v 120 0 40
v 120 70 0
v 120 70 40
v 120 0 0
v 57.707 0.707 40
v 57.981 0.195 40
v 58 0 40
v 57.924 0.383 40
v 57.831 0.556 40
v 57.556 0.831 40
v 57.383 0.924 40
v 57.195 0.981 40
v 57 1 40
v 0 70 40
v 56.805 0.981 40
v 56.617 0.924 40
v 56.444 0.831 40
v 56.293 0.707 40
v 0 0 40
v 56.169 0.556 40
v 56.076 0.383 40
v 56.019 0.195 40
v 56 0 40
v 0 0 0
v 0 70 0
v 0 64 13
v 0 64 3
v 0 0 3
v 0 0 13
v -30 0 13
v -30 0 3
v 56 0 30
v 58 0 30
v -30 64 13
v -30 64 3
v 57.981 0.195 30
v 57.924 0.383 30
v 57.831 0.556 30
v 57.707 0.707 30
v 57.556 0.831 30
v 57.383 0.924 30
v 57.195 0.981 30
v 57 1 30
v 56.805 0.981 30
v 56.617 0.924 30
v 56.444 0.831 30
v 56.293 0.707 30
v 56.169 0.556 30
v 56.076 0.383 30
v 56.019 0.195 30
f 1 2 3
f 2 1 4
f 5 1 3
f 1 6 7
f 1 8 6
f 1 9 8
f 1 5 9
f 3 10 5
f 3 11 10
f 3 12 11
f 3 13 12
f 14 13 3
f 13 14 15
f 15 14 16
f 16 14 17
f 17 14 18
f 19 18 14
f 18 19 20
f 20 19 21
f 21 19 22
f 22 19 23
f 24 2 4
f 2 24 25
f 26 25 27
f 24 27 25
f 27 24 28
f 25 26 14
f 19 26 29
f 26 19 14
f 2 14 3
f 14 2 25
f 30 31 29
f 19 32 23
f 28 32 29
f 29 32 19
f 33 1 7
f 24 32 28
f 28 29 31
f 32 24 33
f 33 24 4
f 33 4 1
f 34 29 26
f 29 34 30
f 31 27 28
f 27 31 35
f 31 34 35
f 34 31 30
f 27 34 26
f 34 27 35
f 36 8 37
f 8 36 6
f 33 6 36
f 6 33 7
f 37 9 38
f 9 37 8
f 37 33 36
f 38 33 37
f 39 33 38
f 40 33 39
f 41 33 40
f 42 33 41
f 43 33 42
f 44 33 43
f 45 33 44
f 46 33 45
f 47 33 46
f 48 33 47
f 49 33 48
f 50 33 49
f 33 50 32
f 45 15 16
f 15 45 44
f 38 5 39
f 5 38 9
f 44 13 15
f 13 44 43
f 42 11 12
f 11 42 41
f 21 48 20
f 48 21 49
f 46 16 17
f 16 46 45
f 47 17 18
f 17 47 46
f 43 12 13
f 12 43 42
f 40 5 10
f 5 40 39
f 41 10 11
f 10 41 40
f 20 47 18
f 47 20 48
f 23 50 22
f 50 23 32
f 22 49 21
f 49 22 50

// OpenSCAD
// Mini Horizontal Gel Electrophoresis Buffer Tank
// Outer dimensions: 120 (X) x 70 (Y) x 40 (Z)
// Wall thickness: 3 mm
// Floor thickness: 3 mm
// Internal platform: 60 (X) x 70 (Y) x 10 (height from inner floor)

$fn = 64;

// Outer dimensions
X_out = 120;
Y_out = 70;
Z_out = 40;

// Thicknesses
wall_t = 3;
floor_t = 3;

// Derived inner dimensions
X_in  = X_out - 2 * wall_t;
Y_in  = Y_out - 2 * wall_t;
Z_in  = Z_out - floor_t; // Inner floor is at z = 0, top of floor is at z = floor_t

// Platform dimensions
plat_len = 60;
plat_w   = Y_in;
plat_h   = 10; // Height above inner floor

// Electrode hole dimensions
hole_d   = 2;
hole_y   = 0;
hole_z   = 30; // Height from inner floor

// Helper to create the main tank shell
module tank_shell() {
    // Base block (floor + walls)
    // Floor is at z=0, thickness floor_t. Walls go up to Z_out.
    // We construct the outer box and subtract the inner void.
    
    // Outer block
    translate([0, 0, 0]) 
        cube([X_out, Y_out, Z_out]);
    
    // Inner void (air space)
    // The void starts at z = floor_t and goes up to Z_out.
    // X range: wall_t to X_out - wall_t
    // Y range: wall_t to Y_out - wall_t
    translate([wall_t, wall_t, floor_t])
        cube([X_in, Y_in, Z_in]);
}

// Helper to create the raised platform
module platform() {
    // Platform sits on the inner floor (z = floor_t)
    // It spans the full inner width (Y_in)
    // It is centered in X
    // Height is plat_h
    
    translate([-plat_len / 2, 0, floor_t])
        cube([plat_len, plat_w, plat_h]);
}

// Helper to create the electrode holes
module electrode_holes() {
    // Two holes, one at each end (X = +/- X_in/2)
    // Hole is horizontal along X axis
    // Position: y = hole_y, z = hole_z (relative to inner floor)
    
    for (x_pos = [-X_in / 2, X_in / 2]) {
        translate([x_pos, hole_y, hole_z])
            cylinder(h = X_in, d = hole_d, $fn = 32);
    }
}

// Main assembly
difference() {
    union() {
        tank_shell();
        platform();
    }
    electrode_holes();
}
